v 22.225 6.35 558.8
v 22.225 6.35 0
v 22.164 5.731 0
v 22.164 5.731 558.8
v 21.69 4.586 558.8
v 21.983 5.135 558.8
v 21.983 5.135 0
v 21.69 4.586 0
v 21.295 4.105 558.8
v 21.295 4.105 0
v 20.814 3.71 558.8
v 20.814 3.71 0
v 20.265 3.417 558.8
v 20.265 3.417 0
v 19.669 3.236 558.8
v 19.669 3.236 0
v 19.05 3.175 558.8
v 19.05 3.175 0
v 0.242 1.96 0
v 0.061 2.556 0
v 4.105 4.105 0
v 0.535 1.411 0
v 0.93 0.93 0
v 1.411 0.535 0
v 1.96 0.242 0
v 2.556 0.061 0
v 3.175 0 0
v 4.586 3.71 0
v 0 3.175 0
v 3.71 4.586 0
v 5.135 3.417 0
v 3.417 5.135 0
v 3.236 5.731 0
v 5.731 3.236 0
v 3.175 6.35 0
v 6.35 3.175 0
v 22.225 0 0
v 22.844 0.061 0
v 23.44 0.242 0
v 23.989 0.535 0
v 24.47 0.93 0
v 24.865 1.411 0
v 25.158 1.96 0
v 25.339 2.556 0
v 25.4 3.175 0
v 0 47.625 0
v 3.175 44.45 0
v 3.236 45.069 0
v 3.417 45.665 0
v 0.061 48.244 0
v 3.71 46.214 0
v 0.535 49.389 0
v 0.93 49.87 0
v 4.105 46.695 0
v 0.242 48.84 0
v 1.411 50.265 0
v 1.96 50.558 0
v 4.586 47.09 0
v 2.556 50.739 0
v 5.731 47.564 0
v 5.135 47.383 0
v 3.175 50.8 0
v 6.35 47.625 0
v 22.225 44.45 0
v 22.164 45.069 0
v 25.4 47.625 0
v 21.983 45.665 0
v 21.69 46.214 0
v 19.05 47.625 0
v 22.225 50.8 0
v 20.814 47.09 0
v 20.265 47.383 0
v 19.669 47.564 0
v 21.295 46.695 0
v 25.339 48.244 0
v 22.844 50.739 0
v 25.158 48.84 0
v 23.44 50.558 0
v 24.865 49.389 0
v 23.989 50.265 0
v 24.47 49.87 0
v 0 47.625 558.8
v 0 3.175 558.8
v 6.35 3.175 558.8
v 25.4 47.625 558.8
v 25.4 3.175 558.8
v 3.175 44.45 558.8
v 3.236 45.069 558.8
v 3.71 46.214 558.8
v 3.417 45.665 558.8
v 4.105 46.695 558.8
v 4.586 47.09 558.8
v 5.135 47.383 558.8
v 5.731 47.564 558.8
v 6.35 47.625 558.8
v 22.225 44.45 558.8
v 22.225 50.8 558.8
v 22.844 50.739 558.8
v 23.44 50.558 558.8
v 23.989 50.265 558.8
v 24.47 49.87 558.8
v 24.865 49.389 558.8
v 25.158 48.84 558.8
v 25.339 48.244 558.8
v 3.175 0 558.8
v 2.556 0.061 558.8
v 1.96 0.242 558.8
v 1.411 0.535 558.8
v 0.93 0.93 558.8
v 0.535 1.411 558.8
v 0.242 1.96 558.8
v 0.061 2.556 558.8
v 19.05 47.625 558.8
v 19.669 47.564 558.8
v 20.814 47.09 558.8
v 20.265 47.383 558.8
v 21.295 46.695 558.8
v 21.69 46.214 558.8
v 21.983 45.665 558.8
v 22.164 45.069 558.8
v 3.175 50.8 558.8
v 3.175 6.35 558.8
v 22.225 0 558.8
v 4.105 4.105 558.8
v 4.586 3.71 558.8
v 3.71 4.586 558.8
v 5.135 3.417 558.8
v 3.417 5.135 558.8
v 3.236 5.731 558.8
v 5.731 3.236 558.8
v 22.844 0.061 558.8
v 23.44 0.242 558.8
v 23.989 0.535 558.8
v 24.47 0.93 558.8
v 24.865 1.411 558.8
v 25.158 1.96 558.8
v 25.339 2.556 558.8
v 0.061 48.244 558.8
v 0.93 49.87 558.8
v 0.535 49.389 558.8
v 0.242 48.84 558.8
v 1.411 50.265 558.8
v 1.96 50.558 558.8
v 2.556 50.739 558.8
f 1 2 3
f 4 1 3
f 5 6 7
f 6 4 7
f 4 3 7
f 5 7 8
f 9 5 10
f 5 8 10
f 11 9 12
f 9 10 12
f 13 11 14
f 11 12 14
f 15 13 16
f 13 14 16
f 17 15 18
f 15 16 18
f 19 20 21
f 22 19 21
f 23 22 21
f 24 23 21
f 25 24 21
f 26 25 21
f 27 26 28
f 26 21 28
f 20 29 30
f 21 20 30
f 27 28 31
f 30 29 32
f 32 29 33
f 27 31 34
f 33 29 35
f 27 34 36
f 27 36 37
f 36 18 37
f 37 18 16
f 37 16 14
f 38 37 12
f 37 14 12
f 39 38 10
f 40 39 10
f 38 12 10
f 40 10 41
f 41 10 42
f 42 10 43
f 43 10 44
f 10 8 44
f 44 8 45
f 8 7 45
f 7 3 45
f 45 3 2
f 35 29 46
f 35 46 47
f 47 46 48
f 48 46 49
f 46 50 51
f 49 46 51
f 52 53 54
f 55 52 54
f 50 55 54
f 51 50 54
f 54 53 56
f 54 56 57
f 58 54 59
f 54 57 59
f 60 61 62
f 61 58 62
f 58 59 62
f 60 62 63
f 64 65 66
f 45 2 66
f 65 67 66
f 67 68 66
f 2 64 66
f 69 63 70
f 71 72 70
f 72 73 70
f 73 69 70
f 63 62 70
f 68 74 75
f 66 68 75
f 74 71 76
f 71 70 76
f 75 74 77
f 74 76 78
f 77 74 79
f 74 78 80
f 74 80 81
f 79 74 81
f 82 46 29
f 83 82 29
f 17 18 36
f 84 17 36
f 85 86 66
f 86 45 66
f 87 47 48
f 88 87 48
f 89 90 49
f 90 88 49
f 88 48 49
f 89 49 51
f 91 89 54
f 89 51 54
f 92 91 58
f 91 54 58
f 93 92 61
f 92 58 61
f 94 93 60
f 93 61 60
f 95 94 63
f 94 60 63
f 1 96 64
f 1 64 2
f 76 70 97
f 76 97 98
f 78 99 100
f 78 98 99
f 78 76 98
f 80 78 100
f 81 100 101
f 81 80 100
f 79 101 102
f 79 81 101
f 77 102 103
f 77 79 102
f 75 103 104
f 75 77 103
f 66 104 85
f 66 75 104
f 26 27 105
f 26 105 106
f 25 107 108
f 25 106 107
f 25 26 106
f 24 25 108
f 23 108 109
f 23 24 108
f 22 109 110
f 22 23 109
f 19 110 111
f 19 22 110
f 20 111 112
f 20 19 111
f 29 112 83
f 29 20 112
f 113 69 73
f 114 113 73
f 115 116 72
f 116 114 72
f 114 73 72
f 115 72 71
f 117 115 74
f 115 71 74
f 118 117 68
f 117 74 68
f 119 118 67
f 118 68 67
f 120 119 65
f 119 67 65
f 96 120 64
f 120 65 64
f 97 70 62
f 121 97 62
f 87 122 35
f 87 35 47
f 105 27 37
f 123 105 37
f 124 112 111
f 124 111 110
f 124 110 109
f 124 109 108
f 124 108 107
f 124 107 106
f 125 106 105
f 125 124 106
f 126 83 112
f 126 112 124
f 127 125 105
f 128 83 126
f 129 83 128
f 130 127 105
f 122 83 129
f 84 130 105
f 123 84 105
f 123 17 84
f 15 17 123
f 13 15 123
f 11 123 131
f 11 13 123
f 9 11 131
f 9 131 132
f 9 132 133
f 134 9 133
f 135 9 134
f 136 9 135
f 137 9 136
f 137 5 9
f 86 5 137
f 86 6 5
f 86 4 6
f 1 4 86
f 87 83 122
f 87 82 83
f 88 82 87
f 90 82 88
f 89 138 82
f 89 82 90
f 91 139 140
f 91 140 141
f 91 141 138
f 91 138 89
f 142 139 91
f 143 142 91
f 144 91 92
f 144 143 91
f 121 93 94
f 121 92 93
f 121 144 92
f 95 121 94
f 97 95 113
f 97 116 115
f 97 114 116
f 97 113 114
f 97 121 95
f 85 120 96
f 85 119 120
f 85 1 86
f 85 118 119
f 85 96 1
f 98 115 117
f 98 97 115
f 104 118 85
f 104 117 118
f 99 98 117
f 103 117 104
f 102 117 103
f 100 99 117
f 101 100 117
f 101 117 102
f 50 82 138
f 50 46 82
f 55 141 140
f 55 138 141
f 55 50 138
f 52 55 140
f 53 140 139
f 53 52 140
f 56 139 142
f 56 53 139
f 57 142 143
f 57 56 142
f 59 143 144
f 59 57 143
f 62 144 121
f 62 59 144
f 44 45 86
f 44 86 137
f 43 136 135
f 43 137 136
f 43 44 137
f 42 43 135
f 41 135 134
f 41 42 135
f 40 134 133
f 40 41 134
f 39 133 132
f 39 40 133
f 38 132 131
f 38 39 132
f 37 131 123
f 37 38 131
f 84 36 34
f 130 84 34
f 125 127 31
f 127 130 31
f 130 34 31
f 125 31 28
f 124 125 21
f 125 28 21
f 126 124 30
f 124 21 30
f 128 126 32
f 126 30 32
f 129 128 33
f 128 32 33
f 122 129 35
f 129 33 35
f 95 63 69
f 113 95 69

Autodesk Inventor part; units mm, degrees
ref_plane "YZ Plane" through (0, 0, 0) normal (1, 0, 0) x (0, 1, 0)
ref_plane "XZ Plane" through (0, 0, 0) normal (0, 1, 0) x (-1, 0, 0)
ref_plane "XY Plane" through (0, 0, 0) normal (0, 0, 1) x (1, 0, 0)
sketch "Sketch1" plane through (0, 0, 0) normal (0, 0, 1) x (1, 0, 0)
  line L0 (3.175, 0) -> (22.225, 0)
  line L1 (25.4, 3.175) -> (25.4, 47.625)
  line L2 (22.225, 50.8) -> (3.175, 50.8)
  line L3 (0, 47.625) -> (0, 3.175)
  arc A0 (3.175, 50.8) -> (0, 47.625) centre (3.175, 47.625) ccw
  arc A1 (25.4, 47.625) -> (22.225, 50.8) centre (22.225, 47.625) ccw
  arc A2 (22.225, 0) -> (25.4, 3.175) centre (22.225, 3.175) ccw
  arc A3 (0, 3.175) -> (3.175, 0) centre (3.175, 3.175) ccw
  line L4 (6.35, 47.625) -> (19.05, 47.625)
  line L5 (22.225, 44.45) -> (22.225, 6.35)
  line L6 (19.05, 3.175) -> (6.35, 3.175)
  line L7 (3.175, 6.35) -> (3.175, 44.45)
  arc A4 (6.35, 47.625) -> (3.175, 44.45) centre (6.35, 44.45) ccw
  arc A5 (22.225, 44.45) -> (19.05, 47.625) centre (19.05, 44.45) ccw
  arc A6 (3.175, 6.35) -> (6.35, 3.175) centre (6.35, 6.35) ccw
  arc A7 (19.05, 3.175) -> (22.225, 6.35) centre (19.05, 6.35) ccw
  point P0 (0, 0)
  point P1 (25.4, 0)
  point P2 (0, 50.8)
  dimension "d0" = 50.8
  dimension "d1" = 25.4
  dimension "d2" = 3.175
  dimension "d3" = 3.175
  dimension "d4" = 3.175
  dimension "d5" = 3.175
  dimension "d6" = 3.175
  dimension "d7" = 3.175
  dimension "d8" = 3.175
  dimension "d9" = 3.175
  dimension "d10" = 3.175
extrude "Extrusion1" add sketch "Sketch1" along normal blind 558.8
properties part number "O channel 22 inch"
